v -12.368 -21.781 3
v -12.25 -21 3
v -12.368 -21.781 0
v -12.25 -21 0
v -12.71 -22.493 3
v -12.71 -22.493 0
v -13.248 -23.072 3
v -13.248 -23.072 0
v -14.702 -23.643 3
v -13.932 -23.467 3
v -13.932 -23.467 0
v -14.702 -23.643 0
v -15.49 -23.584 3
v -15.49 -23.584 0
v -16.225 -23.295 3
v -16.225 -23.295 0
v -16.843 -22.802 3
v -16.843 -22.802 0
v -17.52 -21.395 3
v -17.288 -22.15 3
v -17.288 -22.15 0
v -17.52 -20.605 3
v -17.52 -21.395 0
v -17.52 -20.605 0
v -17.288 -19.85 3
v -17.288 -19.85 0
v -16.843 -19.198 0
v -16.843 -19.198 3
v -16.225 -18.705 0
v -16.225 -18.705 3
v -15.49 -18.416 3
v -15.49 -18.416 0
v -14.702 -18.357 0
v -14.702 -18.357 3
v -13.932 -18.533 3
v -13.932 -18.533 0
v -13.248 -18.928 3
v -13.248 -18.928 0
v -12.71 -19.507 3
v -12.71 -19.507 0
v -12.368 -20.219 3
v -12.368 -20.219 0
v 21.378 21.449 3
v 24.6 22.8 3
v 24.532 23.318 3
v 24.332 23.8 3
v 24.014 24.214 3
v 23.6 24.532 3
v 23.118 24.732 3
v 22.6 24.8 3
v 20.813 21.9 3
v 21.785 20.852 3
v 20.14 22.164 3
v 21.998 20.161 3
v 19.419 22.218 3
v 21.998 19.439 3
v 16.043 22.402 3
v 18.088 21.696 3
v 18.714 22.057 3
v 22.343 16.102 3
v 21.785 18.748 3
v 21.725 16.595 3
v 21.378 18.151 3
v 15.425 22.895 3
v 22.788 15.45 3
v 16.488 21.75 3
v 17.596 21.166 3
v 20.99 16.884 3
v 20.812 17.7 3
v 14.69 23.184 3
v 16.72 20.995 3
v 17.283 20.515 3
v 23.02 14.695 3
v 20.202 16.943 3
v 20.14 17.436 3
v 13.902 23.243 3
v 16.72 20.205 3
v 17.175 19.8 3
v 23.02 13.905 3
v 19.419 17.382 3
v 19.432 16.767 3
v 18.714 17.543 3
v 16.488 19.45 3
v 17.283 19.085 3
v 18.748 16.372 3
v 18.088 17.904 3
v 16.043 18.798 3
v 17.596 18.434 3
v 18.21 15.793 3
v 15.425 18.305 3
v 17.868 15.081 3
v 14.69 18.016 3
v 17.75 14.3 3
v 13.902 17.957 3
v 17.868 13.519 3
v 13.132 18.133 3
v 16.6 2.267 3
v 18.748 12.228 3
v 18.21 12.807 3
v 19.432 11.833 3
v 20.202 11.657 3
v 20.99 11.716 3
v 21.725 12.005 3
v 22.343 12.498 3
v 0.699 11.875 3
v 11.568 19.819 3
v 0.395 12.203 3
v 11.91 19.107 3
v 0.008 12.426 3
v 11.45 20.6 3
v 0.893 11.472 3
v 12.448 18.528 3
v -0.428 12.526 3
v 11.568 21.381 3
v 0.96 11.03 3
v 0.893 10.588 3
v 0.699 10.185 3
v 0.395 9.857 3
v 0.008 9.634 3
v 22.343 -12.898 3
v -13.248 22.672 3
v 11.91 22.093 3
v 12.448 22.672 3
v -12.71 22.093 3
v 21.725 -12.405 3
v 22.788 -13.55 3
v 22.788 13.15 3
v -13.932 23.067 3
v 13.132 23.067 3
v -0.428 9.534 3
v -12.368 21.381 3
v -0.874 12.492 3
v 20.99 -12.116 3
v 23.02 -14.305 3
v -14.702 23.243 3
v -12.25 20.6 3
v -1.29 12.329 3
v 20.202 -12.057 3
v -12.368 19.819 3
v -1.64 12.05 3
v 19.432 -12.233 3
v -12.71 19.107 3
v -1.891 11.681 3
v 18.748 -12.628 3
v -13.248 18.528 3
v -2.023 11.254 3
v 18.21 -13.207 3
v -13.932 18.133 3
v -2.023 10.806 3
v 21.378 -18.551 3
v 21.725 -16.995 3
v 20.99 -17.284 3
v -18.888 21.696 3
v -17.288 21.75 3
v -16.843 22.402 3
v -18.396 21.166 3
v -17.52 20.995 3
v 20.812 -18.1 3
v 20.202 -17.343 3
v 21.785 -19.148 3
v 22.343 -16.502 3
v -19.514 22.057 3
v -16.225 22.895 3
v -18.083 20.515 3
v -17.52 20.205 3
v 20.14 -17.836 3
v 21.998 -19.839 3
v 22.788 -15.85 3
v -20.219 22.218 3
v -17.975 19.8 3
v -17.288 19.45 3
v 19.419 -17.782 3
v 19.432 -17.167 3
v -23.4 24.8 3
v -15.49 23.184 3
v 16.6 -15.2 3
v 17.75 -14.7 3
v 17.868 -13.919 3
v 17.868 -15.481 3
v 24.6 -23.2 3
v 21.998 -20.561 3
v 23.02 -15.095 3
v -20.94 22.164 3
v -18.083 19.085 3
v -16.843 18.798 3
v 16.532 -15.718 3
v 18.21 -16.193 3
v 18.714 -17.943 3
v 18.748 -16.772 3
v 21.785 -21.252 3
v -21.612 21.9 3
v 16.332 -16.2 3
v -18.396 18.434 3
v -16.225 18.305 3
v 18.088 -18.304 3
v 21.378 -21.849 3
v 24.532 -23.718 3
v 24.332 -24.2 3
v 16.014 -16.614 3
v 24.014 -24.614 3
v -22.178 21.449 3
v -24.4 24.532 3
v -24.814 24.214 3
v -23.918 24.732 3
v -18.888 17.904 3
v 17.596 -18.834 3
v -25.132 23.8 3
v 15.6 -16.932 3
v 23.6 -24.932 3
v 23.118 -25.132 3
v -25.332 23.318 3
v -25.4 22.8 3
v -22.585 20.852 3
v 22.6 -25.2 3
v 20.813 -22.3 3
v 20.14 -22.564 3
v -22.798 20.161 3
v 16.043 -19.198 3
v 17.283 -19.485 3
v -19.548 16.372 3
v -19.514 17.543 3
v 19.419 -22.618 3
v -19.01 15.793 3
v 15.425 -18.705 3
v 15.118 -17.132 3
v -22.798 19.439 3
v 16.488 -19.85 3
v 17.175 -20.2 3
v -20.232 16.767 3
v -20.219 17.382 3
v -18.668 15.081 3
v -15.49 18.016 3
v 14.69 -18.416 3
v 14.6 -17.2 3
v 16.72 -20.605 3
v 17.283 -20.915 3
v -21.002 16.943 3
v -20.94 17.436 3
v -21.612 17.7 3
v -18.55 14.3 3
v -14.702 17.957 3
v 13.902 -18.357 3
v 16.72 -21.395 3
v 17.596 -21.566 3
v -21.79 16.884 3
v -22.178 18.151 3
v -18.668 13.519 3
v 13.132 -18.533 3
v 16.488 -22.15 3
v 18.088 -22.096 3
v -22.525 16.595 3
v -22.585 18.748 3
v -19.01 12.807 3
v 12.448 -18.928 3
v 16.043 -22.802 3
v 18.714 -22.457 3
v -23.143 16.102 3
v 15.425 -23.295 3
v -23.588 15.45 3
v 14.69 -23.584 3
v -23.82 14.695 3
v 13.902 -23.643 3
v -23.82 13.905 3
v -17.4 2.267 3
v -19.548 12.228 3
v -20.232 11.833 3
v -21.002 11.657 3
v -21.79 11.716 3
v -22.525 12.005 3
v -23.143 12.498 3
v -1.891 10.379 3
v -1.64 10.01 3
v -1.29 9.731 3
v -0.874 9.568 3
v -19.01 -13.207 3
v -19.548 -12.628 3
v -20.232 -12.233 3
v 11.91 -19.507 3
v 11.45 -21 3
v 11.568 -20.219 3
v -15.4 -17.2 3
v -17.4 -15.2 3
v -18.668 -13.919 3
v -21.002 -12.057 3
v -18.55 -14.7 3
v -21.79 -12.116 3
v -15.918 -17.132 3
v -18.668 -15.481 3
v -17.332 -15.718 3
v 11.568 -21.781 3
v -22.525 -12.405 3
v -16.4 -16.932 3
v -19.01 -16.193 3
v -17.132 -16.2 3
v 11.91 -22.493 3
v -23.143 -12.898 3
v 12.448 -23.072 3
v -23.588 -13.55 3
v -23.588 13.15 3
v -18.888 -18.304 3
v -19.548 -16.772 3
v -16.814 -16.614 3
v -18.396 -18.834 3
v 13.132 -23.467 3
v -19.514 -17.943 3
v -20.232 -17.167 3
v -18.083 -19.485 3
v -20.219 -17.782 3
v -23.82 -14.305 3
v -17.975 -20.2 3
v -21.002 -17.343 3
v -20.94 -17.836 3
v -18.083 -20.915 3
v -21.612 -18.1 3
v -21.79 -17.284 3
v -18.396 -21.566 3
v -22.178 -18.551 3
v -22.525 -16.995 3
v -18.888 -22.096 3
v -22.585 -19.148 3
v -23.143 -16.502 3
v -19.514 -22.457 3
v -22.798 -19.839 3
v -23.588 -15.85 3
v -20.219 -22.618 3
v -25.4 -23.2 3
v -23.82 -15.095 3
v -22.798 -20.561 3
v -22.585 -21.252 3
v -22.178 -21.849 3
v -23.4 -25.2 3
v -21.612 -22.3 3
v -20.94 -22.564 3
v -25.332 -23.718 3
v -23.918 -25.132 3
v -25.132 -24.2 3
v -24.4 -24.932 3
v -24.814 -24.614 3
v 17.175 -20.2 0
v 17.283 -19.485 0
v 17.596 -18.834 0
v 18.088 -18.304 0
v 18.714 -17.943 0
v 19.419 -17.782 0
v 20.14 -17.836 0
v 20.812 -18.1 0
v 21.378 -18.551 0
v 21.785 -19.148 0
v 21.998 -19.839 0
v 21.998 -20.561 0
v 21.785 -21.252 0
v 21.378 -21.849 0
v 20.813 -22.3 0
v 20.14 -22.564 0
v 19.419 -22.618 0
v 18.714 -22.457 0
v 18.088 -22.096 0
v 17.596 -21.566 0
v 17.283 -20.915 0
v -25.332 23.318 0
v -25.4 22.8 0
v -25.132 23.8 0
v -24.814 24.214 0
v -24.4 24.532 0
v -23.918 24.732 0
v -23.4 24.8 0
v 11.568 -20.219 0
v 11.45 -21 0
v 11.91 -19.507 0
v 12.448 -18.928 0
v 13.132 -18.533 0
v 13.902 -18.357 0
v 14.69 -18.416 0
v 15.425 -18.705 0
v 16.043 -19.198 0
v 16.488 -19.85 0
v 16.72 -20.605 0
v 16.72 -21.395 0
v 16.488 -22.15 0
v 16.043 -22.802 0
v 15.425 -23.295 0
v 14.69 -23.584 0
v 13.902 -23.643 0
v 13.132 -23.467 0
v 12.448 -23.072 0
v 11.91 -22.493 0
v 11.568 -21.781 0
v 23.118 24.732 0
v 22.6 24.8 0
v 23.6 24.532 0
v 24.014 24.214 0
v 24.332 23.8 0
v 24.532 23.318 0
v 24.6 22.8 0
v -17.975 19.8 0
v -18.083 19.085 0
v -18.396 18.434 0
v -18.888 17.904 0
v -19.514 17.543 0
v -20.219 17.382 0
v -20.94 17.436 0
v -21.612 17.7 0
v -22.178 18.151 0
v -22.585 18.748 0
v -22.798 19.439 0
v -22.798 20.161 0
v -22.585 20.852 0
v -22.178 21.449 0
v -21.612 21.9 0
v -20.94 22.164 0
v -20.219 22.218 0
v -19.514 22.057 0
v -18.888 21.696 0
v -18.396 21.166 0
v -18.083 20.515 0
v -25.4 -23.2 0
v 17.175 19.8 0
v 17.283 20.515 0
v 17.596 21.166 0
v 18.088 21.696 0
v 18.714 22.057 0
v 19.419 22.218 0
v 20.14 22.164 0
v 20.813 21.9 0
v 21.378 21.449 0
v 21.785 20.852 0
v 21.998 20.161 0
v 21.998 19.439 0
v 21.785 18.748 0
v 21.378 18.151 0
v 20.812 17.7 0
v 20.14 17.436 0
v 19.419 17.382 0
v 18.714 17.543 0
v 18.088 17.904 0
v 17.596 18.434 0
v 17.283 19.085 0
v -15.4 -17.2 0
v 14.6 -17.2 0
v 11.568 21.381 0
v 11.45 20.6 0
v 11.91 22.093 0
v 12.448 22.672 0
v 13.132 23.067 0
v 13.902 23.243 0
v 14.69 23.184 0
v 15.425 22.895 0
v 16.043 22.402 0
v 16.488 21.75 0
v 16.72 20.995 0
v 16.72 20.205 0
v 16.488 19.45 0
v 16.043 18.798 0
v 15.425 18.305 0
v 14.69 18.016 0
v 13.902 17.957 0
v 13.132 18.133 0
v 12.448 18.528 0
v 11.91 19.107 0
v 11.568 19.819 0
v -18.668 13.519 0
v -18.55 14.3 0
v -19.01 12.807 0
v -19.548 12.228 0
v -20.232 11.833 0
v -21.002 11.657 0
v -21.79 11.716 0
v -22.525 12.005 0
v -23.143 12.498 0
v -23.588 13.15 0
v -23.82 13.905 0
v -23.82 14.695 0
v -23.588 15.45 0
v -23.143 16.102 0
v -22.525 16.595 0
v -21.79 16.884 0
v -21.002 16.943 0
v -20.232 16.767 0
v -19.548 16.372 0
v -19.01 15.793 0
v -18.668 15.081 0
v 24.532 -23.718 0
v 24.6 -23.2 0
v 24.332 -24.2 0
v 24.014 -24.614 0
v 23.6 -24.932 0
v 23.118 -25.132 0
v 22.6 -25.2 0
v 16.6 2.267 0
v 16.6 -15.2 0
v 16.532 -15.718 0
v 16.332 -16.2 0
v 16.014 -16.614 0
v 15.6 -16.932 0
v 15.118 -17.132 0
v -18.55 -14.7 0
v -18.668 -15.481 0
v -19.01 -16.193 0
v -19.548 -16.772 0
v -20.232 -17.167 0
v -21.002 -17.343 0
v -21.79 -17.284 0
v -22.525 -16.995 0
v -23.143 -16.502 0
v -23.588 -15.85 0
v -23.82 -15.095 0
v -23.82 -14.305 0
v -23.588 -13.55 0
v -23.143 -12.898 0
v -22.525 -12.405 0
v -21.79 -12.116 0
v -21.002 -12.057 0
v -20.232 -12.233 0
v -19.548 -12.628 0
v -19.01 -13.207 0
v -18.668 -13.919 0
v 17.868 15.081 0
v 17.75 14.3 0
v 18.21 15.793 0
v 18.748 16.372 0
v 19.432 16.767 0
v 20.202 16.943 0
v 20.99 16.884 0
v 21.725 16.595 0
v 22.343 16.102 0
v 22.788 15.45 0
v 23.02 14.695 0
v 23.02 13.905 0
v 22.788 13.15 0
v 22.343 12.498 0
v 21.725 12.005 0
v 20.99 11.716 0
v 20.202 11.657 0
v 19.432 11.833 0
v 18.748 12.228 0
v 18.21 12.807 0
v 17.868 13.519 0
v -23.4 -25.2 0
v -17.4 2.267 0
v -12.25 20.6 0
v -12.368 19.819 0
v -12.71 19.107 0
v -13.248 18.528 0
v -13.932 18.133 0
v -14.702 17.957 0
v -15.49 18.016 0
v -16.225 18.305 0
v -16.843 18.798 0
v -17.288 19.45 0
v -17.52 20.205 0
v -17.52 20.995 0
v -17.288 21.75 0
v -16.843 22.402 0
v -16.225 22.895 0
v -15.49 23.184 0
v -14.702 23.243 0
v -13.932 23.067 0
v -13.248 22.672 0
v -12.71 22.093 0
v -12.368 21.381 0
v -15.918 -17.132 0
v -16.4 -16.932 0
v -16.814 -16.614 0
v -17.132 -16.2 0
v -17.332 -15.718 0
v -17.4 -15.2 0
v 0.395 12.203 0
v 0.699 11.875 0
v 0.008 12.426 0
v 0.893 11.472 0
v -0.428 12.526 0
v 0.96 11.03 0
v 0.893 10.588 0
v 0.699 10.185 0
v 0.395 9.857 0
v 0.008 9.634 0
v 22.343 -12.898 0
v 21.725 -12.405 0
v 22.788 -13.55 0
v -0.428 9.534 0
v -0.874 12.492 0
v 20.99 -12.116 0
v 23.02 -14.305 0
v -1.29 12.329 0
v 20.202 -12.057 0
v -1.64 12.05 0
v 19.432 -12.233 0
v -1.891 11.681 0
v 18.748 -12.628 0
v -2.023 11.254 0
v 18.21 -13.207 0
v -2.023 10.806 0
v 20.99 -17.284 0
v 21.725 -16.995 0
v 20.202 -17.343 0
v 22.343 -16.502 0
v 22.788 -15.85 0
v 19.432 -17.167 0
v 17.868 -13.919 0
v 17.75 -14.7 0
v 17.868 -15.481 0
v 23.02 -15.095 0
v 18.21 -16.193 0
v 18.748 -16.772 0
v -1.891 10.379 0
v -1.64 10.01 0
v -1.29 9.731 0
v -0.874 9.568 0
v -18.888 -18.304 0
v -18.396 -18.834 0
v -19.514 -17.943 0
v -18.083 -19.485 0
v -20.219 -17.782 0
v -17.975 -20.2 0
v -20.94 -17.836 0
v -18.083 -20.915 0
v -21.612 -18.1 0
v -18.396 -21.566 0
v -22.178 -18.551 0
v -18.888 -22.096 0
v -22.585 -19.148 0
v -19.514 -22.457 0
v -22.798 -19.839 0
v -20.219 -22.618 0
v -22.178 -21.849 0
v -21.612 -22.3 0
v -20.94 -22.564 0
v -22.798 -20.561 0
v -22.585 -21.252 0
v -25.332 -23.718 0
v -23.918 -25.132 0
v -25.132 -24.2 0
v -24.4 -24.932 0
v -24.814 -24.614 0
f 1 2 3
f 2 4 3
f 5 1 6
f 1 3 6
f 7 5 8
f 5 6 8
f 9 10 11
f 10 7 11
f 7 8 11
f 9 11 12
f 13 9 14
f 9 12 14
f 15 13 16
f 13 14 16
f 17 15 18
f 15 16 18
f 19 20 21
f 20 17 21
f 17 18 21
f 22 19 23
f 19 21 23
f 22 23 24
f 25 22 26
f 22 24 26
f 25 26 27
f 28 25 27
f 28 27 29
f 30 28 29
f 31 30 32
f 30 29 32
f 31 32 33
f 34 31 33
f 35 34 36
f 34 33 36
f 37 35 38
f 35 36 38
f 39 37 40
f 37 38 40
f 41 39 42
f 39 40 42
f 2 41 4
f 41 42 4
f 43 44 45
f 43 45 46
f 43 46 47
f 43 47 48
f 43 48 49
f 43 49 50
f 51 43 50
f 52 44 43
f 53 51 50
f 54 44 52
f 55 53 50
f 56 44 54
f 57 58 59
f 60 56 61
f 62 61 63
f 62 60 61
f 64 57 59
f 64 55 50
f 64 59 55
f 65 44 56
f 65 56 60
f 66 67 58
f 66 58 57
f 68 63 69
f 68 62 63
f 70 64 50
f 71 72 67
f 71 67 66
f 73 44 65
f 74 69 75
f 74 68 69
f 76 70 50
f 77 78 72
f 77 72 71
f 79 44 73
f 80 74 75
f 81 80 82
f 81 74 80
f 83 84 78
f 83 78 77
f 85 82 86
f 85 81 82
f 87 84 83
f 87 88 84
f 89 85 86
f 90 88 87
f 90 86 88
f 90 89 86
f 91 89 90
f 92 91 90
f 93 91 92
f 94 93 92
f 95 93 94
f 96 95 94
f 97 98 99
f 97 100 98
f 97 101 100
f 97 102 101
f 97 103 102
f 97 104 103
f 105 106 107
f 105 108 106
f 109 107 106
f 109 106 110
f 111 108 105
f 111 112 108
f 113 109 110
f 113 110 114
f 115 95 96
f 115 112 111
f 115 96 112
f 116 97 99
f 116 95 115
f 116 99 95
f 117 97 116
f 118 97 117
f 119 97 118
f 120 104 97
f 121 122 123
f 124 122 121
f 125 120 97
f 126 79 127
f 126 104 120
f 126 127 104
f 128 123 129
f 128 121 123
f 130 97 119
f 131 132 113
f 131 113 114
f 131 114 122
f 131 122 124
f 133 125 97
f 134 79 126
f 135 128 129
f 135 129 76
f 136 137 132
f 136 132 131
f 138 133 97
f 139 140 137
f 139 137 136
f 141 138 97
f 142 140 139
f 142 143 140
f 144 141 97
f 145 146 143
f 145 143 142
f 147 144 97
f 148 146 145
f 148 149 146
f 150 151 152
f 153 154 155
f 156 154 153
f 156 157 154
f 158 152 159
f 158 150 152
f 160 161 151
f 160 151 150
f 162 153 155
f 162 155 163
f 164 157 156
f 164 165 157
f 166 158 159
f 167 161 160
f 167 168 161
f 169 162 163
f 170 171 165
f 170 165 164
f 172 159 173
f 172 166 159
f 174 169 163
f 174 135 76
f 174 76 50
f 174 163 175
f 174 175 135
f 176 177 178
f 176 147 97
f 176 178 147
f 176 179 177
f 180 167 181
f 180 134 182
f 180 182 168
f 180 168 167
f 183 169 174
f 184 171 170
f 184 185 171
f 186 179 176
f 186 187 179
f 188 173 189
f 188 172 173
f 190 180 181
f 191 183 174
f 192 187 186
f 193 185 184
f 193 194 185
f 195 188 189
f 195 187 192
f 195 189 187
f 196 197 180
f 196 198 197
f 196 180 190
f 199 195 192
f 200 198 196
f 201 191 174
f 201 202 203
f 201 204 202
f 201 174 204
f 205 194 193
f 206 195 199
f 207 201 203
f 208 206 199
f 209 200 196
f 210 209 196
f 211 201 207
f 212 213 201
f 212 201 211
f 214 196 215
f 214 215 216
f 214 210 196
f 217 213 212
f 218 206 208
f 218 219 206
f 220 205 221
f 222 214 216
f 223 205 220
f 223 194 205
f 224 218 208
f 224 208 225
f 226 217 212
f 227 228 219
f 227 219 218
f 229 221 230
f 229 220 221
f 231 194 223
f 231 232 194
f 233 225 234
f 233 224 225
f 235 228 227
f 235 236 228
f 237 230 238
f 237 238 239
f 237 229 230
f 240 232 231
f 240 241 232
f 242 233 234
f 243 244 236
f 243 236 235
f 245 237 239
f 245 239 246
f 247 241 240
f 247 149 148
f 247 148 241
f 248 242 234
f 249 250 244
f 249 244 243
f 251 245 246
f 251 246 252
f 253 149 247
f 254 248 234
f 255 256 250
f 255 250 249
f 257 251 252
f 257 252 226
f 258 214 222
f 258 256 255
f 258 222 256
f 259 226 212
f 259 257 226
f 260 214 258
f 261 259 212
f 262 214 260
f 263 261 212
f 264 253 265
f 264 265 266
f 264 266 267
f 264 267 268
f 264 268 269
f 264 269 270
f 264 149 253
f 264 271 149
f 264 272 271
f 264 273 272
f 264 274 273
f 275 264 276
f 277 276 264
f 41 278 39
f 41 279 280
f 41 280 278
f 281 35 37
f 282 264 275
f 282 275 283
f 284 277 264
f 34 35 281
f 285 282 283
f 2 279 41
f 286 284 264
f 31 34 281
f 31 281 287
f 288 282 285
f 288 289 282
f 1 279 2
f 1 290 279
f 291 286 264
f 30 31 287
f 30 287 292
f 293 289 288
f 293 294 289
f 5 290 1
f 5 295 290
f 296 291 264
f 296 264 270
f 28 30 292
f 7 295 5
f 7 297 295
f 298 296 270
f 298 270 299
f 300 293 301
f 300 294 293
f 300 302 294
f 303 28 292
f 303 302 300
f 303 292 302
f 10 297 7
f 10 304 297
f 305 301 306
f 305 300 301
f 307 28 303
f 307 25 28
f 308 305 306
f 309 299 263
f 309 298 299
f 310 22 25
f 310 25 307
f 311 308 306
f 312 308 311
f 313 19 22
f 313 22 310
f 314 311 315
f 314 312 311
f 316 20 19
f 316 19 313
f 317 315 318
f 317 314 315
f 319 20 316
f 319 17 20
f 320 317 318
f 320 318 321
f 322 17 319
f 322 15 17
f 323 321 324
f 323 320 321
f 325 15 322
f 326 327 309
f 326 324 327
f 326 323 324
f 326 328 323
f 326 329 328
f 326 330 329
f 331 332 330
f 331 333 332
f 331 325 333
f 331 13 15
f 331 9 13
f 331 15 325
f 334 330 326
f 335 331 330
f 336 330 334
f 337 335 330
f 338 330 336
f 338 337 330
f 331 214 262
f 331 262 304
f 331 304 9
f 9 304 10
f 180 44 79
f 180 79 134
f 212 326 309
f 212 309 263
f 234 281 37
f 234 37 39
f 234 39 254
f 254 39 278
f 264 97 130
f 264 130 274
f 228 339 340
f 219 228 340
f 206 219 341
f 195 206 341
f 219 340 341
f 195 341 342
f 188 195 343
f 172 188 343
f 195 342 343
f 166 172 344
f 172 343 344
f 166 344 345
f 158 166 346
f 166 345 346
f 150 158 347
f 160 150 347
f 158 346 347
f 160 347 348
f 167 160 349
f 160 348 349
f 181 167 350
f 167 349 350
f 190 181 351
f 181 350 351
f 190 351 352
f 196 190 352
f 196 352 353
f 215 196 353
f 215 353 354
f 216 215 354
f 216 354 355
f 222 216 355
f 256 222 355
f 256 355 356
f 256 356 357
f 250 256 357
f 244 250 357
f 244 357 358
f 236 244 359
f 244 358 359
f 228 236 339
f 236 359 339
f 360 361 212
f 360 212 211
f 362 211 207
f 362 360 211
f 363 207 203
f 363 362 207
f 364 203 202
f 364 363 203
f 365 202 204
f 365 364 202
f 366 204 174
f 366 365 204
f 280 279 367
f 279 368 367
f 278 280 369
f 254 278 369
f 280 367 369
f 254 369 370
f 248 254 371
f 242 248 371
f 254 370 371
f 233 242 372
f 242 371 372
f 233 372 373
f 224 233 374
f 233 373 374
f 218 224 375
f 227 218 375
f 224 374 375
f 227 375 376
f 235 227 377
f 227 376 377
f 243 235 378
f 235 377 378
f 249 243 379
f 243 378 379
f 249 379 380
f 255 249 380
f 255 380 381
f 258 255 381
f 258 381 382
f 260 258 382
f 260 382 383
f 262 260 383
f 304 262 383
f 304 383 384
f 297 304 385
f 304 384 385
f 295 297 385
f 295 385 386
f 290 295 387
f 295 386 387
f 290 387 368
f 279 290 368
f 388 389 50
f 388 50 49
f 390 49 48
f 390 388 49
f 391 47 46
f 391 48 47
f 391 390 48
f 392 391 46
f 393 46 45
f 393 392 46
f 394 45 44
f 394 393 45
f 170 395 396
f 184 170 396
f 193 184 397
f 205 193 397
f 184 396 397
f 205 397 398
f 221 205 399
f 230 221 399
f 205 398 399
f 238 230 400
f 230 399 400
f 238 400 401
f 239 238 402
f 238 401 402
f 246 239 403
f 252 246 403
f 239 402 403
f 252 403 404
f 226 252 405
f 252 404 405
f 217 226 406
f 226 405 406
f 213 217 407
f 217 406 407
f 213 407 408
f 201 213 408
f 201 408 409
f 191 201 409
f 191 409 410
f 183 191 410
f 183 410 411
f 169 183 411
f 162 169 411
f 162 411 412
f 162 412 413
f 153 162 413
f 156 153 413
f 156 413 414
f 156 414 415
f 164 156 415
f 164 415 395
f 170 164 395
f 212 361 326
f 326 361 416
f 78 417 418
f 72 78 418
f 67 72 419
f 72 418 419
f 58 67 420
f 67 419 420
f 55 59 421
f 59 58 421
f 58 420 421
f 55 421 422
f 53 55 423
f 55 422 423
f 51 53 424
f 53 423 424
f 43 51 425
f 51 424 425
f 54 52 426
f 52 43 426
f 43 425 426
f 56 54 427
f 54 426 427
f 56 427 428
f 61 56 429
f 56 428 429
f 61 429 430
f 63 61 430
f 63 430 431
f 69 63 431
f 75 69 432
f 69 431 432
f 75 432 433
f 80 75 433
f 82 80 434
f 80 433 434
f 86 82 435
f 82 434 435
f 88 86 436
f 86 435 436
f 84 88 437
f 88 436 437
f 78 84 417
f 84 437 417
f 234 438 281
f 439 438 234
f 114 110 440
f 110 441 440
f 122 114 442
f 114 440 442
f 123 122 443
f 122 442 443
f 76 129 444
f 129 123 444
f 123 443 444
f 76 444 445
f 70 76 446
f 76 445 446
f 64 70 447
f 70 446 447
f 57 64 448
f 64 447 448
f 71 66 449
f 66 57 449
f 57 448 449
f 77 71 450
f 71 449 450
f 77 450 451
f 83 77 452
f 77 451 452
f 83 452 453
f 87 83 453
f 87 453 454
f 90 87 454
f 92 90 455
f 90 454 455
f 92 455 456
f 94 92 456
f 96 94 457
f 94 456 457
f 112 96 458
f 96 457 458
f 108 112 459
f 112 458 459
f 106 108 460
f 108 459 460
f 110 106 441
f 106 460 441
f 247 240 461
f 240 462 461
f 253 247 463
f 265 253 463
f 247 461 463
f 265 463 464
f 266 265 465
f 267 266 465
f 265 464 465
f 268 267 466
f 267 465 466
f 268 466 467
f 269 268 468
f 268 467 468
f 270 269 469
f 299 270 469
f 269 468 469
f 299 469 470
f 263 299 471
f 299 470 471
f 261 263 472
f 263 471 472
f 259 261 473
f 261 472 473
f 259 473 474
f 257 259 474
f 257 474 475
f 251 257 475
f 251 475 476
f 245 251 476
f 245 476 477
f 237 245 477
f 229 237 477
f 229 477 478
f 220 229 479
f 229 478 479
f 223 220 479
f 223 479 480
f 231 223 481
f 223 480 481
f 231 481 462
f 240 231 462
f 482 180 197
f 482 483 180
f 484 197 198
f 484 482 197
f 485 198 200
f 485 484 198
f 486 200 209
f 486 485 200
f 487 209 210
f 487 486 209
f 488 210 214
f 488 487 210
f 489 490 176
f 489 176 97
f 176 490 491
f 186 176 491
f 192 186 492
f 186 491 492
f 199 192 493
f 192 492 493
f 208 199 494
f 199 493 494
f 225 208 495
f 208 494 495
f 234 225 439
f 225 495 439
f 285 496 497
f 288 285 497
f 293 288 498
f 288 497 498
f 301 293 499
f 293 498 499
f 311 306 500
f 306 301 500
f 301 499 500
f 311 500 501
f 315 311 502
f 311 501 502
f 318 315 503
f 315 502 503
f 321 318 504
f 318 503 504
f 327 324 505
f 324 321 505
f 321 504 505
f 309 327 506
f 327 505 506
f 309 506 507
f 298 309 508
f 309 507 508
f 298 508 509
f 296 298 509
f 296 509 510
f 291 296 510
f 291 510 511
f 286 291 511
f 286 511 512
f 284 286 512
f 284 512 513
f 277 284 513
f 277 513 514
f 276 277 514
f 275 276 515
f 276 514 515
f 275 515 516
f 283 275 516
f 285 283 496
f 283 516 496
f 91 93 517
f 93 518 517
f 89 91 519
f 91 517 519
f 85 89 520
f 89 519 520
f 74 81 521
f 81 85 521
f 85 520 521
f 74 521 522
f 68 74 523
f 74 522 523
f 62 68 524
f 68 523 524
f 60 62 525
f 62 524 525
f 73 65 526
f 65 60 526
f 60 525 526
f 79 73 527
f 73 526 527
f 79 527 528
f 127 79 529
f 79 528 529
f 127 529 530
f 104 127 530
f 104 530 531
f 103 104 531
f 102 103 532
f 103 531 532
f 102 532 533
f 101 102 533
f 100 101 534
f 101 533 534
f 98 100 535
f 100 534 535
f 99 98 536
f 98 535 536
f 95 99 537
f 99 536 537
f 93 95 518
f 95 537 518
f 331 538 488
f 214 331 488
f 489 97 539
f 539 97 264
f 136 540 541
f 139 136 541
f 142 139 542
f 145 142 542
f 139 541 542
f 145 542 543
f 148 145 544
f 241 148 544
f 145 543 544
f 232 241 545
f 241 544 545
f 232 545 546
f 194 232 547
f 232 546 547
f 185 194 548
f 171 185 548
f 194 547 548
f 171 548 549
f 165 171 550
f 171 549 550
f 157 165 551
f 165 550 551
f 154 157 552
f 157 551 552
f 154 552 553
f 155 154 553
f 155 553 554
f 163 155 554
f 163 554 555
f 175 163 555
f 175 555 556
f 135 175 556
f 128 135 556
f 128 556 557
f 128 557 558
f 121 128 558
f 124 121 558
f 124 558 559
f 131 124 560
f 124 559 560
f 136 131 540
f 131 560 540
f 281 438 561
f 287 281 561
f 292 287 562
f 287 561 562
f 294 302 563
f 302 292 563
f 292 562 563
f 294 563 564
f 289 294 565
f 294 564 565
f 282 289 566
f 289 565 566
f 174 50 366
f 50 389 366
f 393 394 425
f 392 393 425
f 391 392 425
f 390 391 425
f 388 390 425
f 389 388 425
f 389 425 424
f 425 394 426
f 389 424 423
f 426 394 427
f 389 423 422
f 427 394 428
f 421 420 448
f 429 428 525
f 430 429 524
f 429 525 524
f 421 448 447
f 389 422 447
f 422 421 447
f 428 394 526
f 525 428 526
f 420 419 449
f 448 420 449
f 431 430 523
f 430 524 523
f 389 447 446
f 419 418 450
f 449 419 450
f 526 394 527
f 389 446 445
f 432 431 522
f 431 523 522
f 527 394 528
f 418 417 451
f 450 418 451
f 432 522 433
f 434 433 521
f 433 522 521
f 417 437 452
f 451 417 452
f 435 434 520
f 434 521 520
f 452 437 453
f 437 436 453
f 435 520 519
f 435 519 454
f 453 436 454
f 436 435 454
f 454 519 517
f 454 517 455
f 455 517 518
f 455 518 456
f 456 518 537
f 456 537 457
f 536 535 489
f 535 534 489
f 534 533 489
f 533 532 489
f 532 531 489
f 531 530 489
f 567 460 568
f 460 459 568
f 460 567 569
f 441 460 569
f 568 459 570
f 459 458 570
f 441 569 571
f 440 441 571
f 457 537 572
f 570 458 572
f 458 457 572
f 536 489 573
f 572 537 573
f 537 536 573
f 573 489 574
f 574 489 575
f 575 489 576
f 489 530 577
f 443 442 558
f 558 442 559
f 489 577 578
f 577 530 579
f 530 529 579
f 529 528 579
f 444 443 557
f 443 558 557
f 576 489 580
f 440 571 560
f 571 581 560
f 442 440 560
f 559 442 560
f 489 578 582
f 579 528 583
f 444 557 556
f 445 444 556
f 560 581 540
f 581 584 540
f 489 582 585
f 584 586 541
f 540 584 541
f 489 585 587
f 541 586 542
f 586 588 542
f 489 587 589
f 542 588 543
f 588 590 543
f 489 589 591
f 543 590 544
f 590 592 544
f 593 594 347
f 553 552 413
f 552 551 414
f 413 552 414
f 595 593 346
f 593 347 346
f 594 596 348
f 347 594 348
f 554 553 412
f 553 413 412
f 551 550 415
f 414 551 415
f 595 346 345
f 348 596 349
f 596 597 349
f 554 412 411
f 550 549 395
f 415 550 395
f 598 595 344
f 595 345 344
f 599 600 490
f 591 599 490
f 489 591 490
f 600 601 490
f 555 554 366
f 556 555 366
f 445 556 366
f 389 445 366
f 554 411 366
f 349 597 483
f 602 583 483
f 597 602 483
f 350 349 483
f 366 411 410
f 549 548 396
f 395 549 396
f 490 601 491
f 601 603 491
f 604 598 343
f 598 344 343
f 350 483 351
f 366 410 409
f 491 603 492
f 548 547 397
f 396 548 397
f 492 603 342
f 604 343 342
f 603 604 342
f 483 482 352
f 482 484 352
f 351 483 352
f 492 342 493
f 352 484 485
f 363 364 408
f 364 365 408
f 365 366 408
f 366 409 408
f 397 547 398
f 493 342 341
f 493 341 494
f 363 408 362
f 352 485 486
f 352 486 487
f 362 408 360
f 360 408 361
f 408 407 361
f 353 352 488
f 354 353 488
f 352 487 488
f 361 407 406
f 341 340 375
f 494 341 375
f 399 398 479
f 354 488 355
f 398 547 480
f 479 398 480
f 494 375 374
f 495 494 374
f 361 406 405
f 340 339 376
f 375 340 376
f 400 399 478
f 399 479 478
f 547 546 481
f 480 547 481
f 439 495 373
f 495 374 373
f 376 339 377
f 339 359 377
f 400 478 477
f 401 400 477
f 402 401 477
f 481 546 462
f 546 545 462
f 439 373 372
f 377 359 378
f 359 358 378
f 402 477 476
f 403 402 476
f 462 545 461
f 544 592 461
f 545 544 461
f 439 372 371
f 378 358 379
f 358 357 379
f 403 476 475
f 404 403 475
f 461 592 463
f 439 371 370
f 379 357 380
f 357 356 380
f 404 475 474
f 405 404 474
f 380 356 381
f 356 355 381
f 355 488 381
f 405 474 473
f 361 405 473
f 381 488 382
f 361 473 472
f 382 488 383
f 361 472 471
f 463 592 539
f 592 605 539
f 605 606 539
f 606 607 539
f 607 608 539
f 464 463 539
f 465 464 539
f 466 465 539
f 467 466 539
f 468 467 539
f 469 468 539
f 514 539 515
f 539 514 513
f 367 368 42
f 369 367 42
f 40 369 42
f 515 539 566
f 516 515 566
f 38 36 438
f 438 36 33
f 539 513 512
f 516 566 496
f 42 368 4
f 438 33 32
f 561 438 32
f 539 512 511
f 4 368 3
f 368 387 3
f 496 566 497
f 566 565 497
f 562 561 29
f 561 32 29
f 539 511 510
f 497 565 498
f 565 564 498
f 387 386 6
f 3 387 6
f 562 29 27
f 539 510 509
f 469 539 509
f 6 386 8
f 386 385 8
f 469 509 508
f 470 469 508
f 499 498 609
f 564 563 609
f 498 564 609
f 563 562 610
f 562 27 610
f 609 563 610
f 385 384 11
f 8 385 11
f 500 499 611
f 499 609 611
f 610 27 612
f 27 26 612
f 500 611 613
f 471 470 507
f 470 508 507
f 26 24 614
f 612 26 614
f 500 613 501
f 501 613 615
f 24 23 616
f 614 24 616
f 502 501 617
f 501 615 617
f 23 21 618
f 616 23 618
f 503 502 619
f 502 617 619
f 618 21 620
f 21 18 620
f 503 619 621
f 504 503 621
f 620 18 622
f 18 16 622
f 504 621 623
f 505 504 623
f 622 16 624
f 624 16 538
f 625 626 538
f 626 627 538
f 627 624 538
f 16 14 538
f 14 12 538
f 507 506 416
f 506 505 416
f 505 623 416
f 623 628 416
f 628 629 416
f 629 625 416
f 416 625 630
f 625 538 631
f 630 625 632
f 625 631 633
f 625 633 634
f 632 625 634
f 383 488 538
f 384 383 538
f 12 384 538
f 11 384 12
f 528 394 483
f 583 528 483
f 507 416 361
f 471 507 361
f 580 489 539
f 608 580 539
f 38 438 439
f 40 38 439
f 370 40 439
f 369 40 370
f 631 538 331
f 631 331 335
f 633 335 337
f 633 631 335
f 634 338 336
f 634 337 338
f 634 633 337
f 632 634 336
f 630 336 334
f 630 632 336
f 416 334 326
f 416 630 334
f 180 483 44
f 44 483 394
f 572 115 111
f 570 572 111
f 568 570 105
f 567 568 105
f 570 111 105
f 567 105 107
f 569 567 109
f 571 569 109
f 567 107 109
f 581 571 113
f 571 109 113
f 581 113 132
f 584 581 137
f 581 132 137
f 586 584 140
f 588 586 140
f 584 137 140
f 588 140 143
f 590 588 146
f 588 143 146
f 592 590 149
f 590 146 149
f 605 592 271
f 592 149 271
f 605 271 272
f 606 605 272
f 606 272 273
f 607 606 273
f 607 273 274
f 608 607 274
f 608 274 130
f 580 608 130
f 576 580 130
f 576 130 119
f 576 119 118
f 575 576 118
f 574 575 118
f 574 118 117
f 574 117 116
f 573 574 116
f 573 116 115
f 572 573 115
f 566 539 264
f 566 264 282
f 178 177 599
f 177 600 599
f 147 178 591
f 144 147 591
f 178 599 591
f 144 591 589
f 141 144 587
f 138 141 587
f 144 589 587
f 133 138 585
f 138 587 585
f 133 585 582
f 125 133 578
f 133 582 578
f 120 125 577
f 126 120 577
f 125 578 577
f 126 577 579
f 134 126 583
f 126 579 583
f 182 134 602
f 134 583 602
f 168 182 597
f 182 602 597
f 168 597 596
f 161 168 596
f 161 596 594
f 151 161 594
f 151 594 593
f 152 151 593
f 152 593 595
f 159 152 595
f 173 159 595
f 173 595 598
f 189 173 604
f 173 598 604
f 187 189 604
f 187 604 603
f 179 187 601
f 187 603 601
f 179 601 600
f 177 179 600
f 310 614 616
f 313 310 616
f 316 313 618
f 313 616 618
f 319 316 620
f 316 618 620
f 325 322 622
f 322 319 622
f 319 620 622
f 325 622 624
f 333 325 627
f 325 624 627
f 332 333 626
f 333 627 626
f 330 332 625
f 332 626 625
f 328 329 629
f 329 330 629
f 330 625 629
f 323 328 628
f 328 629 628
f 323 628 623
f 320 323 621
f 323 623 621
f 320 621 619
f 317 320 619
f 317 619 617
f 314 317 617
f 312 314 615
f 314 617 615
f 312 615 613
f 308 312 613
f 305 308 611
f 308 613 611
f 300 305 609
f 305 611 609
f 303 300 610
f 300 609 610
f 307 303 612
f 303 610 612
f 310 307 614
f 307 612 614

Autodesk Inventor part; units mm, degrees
ref_plane "YZ Plane" through (0, 0, 0) normal (1, 0, 0) x (0, 1, 0)
ref_plane "XZ Plane" through (0, 0, 0) normal (0, 1, 0) x (-1, 0, 0)
ref_plane "XY Plane" through (0, 0, 0) normal (0, 0, 1) x (1, 0, 0)
sketch "Skizze1" plane through (0, 0, 0) normal (0, 0, 1) x (1, 0, 0)
  line L0 (-17.4, -0.2) -> (-25.4, -0.2)
  line L1 (-25.4, -0.2) -> (-25.4, -23.2)
  line L2 (-23.4, -25.2) -> (-0.4, -25.2)
  line L3 (-0.4, -25.2) -> (-0.4, -17.2)
  line L4 (-17.4, -0.2) -> (-17.4, -15.2)
  line L5 (-15.4, -17.2) -> (-0.4, -17.2)
  arc A0 (-25.4, -23.2) -> (-23.4, -25.2) centre (-23.4, -23.2) ccw
  circle A1 centre (-20.4, -20.2) radius 2.425
  circle A2 centre (-21.2, -14.7) radius 2.65
  circle A3 centre (-14.9, -21) radius 2.65
  arc A4 (-17.4, -15.2) -> (-15.4, -17.2) centre (-15.4, -15.2) ccw
  circle A5 centre (-20.4, -20.2) radius 2.425
  circle A6 centre (-14.9, -21) radius 2.65
  circle A7 centre (-21.2, -14.7) radius 2.65
  point P0 (-25.4, -25.2)
  point P1 (-17.4, -17.2)
  dimension "d278" = 25
  dimension "d279" = 25
  dimension "d2" = 8
  dimension "d281" = 8
  dimension "d282" = 2
  dimension "d283" = 4.85
  dimension "d284" = 20
  dimension "d4" = 20
  dimension "d286" = 5.3
  dimension "d_hole" = 5.3
  dimension "d290" = 20.8
  dimension "d" = 20.8
  dimension "d292" = 2
  dimension "d313" = 6.3
  dimension "d314" = 6.3
  dimension "d330" = 0
  dimension "d331" = 0
  dimension "d332" = 0
extrude "Extrusion1" add sketch "Skizze1" along normal blind 3
mirror "Mirror6" about plane through (-17.4, -0.2, 0) normal (0, 1, 0) of "Extrusion1"
mirror "Mirror7" about plane through (-0.4, -25.2, 0) normal (1, 0, 0) of "Extrusion1", "Mirror6"
sketch "Sketch32" plane through (0, 0, 3) normal (0, 0, 1) x (1, 0, 0)
  circle A0 centre (-0.54, 11.03) radius 1.4 projected
  circle A1 centre (-0.54, 11.03) radius 7 construction
  circle A2 centre (-0.54, 11.03) radius 1.75 projected
  line L0 (22.6, 24.8) -> (-23.4, 24.8) projected
  arc A3 (-23.4, 24.8) -> (-25.4, 22.8) centre (-23.4, 22.8) ccw projected
  line L1 (-25.4, -23.2) -> (-25.4, 22.8) projected
  arc A4 (-25.4, -23.2) -> (-23.4, -25.2) centre (-23.4, -23.2) ccw projected
  line L2 (-23.4, -25.2) -> (22.6, -25.2) projected
  arc A5 (22.6, -25.2) -> (24.6, -23.2) centre (22.6, -23.2) ccw projected
  line L3 (24.6, 22.8) -> (24.6, -23.2) projected
  arc A6 (24.6, 22.8) -> (22.6, 24.8) centre (22.6, 22.8) ccw projected
  circle A7 centre (19.6, 19.8) radius 2.425 projected
  circle A8 centre (14.1, 20.6) radius 2.65 projected
  circle A9 centre (20.4, 14.3) radius 2.65 projected
  circle A10 centre (19.6, -20.2) radius 2.425 projected
  circle A11 centre (14.1, -21) radius 2.65 projected
  circle A12 centre (20.4, -14.7) radius 2.65 projected
  circle A13 centre (-20.4, 19.8) radius 2.425 projected
  circle A14 centre (-14.9, 20.6) radius 2.65 projected
  circle A15 centre (-21.2, 14.3) radius 2.65 projected
  circle A16 centre (-21.2, -14.7) radius 2.65 projected
  circle A17 centre (-14.9, -21) radius 2.65 projected
  circle A18 centre (-20.4, -20.2) radius 2.425 projected
  line L4 (14.6, 16.8) -> (-15.4, 16.8) projected
  arc A19 (16.6, 14.8) -> (14.6, 16.8) centre (14.6, 14.8) ccw projected
  line L5 (16.6, 14.8) -> (16.6, -15.2) projected
  arc A20 (14.6, -17.2) -> (16.6, -15.2) centre (14.6, -15.2) ccw projected
  line L6 (-15.4, -17.2) -> (14.6, -17.2) projected
  arc A21 (-17.4, -15.2) -> (-15.4, -17.2) centre (-15.4, -15.2) ccw projected
  line L7 (-17.4, -15.2) -> (-17.4, 14.8) projected
  arc A22 (-15.4, 16.8) -> (-17.4, 14.8) centre (-15.4, 14.8) ccw projected
  line L8 (16.6, 14.8) -> (16.6, -15.2) projected
  circle A23 centre (-0.54, 11.03) radius 1.5
  line L9 (16.6, 2.2667) -> (-17.4, 2.2667)
  line L10 (-17.4, -15.2) -> (-17.4, 14.8) projected
  point P0 (0, 0)
  dimension "d354" = 3
extrude "Extrusion17" add sketch "Sketch32" against normal blind 3 contours A2 | A19 L5 L9 L7 A22 L4
equation "\"d_i\" = 40"
equation "\"d_o\" = 40"
equation "\"d_part\" = 50"
equation "\"d6\" = 0"
equation "\"d7\" = 0"
equation "\"d8\" = 0"
equation "\"d9\" = 0"
equation "\"d13\" = 0"
equation "\"d14\" = 0"
equation "\"d20\" = 0"
equation "\"d21\" = 0"
equation "\"d22\" = 0"
equation "\"d23\" = 0"
equation "\"d24\" = 0"
equation "\"d25\" = 3"
equation "\"d26\" = 0"
equation "\"d27\" = 0"
equation "\"d28\" = 0"
equation "\"d29\" = 0"
equation "\"d30\" = 0"
equation "\"d31\" = 0"
equation "\"d32\" = 0"
equation "\"d33\" = 0"
equation "\"d34\" = 0"
equation "\"d46\" = 0"
equation "\"d47\" = 0"
equation "\"d48\" = 0"
equation "\"d50\" = 0"
equation "\"d51\" = 0"
equation "\"d52\" = 0"
equation "\"d53\" = 0"
equation "\"d54\" = 0"
equation "\"d55\" = 0"
equation "\"d56\" = 0"
equation "\"d57\" = 0"
equation "\"d58\" = 0"
equation "\"d59\" = 0"
equation "\"magnet_offset\" = 0"
equation "\"screw_offset\" = 0"
equation "\"mal_puzzle_offset\" = 0"
equation "\"fem_puzzle_offset\" = 0"
properties part number "30_Cube_Z_Focus_MGN_NEMA_counterplate"
